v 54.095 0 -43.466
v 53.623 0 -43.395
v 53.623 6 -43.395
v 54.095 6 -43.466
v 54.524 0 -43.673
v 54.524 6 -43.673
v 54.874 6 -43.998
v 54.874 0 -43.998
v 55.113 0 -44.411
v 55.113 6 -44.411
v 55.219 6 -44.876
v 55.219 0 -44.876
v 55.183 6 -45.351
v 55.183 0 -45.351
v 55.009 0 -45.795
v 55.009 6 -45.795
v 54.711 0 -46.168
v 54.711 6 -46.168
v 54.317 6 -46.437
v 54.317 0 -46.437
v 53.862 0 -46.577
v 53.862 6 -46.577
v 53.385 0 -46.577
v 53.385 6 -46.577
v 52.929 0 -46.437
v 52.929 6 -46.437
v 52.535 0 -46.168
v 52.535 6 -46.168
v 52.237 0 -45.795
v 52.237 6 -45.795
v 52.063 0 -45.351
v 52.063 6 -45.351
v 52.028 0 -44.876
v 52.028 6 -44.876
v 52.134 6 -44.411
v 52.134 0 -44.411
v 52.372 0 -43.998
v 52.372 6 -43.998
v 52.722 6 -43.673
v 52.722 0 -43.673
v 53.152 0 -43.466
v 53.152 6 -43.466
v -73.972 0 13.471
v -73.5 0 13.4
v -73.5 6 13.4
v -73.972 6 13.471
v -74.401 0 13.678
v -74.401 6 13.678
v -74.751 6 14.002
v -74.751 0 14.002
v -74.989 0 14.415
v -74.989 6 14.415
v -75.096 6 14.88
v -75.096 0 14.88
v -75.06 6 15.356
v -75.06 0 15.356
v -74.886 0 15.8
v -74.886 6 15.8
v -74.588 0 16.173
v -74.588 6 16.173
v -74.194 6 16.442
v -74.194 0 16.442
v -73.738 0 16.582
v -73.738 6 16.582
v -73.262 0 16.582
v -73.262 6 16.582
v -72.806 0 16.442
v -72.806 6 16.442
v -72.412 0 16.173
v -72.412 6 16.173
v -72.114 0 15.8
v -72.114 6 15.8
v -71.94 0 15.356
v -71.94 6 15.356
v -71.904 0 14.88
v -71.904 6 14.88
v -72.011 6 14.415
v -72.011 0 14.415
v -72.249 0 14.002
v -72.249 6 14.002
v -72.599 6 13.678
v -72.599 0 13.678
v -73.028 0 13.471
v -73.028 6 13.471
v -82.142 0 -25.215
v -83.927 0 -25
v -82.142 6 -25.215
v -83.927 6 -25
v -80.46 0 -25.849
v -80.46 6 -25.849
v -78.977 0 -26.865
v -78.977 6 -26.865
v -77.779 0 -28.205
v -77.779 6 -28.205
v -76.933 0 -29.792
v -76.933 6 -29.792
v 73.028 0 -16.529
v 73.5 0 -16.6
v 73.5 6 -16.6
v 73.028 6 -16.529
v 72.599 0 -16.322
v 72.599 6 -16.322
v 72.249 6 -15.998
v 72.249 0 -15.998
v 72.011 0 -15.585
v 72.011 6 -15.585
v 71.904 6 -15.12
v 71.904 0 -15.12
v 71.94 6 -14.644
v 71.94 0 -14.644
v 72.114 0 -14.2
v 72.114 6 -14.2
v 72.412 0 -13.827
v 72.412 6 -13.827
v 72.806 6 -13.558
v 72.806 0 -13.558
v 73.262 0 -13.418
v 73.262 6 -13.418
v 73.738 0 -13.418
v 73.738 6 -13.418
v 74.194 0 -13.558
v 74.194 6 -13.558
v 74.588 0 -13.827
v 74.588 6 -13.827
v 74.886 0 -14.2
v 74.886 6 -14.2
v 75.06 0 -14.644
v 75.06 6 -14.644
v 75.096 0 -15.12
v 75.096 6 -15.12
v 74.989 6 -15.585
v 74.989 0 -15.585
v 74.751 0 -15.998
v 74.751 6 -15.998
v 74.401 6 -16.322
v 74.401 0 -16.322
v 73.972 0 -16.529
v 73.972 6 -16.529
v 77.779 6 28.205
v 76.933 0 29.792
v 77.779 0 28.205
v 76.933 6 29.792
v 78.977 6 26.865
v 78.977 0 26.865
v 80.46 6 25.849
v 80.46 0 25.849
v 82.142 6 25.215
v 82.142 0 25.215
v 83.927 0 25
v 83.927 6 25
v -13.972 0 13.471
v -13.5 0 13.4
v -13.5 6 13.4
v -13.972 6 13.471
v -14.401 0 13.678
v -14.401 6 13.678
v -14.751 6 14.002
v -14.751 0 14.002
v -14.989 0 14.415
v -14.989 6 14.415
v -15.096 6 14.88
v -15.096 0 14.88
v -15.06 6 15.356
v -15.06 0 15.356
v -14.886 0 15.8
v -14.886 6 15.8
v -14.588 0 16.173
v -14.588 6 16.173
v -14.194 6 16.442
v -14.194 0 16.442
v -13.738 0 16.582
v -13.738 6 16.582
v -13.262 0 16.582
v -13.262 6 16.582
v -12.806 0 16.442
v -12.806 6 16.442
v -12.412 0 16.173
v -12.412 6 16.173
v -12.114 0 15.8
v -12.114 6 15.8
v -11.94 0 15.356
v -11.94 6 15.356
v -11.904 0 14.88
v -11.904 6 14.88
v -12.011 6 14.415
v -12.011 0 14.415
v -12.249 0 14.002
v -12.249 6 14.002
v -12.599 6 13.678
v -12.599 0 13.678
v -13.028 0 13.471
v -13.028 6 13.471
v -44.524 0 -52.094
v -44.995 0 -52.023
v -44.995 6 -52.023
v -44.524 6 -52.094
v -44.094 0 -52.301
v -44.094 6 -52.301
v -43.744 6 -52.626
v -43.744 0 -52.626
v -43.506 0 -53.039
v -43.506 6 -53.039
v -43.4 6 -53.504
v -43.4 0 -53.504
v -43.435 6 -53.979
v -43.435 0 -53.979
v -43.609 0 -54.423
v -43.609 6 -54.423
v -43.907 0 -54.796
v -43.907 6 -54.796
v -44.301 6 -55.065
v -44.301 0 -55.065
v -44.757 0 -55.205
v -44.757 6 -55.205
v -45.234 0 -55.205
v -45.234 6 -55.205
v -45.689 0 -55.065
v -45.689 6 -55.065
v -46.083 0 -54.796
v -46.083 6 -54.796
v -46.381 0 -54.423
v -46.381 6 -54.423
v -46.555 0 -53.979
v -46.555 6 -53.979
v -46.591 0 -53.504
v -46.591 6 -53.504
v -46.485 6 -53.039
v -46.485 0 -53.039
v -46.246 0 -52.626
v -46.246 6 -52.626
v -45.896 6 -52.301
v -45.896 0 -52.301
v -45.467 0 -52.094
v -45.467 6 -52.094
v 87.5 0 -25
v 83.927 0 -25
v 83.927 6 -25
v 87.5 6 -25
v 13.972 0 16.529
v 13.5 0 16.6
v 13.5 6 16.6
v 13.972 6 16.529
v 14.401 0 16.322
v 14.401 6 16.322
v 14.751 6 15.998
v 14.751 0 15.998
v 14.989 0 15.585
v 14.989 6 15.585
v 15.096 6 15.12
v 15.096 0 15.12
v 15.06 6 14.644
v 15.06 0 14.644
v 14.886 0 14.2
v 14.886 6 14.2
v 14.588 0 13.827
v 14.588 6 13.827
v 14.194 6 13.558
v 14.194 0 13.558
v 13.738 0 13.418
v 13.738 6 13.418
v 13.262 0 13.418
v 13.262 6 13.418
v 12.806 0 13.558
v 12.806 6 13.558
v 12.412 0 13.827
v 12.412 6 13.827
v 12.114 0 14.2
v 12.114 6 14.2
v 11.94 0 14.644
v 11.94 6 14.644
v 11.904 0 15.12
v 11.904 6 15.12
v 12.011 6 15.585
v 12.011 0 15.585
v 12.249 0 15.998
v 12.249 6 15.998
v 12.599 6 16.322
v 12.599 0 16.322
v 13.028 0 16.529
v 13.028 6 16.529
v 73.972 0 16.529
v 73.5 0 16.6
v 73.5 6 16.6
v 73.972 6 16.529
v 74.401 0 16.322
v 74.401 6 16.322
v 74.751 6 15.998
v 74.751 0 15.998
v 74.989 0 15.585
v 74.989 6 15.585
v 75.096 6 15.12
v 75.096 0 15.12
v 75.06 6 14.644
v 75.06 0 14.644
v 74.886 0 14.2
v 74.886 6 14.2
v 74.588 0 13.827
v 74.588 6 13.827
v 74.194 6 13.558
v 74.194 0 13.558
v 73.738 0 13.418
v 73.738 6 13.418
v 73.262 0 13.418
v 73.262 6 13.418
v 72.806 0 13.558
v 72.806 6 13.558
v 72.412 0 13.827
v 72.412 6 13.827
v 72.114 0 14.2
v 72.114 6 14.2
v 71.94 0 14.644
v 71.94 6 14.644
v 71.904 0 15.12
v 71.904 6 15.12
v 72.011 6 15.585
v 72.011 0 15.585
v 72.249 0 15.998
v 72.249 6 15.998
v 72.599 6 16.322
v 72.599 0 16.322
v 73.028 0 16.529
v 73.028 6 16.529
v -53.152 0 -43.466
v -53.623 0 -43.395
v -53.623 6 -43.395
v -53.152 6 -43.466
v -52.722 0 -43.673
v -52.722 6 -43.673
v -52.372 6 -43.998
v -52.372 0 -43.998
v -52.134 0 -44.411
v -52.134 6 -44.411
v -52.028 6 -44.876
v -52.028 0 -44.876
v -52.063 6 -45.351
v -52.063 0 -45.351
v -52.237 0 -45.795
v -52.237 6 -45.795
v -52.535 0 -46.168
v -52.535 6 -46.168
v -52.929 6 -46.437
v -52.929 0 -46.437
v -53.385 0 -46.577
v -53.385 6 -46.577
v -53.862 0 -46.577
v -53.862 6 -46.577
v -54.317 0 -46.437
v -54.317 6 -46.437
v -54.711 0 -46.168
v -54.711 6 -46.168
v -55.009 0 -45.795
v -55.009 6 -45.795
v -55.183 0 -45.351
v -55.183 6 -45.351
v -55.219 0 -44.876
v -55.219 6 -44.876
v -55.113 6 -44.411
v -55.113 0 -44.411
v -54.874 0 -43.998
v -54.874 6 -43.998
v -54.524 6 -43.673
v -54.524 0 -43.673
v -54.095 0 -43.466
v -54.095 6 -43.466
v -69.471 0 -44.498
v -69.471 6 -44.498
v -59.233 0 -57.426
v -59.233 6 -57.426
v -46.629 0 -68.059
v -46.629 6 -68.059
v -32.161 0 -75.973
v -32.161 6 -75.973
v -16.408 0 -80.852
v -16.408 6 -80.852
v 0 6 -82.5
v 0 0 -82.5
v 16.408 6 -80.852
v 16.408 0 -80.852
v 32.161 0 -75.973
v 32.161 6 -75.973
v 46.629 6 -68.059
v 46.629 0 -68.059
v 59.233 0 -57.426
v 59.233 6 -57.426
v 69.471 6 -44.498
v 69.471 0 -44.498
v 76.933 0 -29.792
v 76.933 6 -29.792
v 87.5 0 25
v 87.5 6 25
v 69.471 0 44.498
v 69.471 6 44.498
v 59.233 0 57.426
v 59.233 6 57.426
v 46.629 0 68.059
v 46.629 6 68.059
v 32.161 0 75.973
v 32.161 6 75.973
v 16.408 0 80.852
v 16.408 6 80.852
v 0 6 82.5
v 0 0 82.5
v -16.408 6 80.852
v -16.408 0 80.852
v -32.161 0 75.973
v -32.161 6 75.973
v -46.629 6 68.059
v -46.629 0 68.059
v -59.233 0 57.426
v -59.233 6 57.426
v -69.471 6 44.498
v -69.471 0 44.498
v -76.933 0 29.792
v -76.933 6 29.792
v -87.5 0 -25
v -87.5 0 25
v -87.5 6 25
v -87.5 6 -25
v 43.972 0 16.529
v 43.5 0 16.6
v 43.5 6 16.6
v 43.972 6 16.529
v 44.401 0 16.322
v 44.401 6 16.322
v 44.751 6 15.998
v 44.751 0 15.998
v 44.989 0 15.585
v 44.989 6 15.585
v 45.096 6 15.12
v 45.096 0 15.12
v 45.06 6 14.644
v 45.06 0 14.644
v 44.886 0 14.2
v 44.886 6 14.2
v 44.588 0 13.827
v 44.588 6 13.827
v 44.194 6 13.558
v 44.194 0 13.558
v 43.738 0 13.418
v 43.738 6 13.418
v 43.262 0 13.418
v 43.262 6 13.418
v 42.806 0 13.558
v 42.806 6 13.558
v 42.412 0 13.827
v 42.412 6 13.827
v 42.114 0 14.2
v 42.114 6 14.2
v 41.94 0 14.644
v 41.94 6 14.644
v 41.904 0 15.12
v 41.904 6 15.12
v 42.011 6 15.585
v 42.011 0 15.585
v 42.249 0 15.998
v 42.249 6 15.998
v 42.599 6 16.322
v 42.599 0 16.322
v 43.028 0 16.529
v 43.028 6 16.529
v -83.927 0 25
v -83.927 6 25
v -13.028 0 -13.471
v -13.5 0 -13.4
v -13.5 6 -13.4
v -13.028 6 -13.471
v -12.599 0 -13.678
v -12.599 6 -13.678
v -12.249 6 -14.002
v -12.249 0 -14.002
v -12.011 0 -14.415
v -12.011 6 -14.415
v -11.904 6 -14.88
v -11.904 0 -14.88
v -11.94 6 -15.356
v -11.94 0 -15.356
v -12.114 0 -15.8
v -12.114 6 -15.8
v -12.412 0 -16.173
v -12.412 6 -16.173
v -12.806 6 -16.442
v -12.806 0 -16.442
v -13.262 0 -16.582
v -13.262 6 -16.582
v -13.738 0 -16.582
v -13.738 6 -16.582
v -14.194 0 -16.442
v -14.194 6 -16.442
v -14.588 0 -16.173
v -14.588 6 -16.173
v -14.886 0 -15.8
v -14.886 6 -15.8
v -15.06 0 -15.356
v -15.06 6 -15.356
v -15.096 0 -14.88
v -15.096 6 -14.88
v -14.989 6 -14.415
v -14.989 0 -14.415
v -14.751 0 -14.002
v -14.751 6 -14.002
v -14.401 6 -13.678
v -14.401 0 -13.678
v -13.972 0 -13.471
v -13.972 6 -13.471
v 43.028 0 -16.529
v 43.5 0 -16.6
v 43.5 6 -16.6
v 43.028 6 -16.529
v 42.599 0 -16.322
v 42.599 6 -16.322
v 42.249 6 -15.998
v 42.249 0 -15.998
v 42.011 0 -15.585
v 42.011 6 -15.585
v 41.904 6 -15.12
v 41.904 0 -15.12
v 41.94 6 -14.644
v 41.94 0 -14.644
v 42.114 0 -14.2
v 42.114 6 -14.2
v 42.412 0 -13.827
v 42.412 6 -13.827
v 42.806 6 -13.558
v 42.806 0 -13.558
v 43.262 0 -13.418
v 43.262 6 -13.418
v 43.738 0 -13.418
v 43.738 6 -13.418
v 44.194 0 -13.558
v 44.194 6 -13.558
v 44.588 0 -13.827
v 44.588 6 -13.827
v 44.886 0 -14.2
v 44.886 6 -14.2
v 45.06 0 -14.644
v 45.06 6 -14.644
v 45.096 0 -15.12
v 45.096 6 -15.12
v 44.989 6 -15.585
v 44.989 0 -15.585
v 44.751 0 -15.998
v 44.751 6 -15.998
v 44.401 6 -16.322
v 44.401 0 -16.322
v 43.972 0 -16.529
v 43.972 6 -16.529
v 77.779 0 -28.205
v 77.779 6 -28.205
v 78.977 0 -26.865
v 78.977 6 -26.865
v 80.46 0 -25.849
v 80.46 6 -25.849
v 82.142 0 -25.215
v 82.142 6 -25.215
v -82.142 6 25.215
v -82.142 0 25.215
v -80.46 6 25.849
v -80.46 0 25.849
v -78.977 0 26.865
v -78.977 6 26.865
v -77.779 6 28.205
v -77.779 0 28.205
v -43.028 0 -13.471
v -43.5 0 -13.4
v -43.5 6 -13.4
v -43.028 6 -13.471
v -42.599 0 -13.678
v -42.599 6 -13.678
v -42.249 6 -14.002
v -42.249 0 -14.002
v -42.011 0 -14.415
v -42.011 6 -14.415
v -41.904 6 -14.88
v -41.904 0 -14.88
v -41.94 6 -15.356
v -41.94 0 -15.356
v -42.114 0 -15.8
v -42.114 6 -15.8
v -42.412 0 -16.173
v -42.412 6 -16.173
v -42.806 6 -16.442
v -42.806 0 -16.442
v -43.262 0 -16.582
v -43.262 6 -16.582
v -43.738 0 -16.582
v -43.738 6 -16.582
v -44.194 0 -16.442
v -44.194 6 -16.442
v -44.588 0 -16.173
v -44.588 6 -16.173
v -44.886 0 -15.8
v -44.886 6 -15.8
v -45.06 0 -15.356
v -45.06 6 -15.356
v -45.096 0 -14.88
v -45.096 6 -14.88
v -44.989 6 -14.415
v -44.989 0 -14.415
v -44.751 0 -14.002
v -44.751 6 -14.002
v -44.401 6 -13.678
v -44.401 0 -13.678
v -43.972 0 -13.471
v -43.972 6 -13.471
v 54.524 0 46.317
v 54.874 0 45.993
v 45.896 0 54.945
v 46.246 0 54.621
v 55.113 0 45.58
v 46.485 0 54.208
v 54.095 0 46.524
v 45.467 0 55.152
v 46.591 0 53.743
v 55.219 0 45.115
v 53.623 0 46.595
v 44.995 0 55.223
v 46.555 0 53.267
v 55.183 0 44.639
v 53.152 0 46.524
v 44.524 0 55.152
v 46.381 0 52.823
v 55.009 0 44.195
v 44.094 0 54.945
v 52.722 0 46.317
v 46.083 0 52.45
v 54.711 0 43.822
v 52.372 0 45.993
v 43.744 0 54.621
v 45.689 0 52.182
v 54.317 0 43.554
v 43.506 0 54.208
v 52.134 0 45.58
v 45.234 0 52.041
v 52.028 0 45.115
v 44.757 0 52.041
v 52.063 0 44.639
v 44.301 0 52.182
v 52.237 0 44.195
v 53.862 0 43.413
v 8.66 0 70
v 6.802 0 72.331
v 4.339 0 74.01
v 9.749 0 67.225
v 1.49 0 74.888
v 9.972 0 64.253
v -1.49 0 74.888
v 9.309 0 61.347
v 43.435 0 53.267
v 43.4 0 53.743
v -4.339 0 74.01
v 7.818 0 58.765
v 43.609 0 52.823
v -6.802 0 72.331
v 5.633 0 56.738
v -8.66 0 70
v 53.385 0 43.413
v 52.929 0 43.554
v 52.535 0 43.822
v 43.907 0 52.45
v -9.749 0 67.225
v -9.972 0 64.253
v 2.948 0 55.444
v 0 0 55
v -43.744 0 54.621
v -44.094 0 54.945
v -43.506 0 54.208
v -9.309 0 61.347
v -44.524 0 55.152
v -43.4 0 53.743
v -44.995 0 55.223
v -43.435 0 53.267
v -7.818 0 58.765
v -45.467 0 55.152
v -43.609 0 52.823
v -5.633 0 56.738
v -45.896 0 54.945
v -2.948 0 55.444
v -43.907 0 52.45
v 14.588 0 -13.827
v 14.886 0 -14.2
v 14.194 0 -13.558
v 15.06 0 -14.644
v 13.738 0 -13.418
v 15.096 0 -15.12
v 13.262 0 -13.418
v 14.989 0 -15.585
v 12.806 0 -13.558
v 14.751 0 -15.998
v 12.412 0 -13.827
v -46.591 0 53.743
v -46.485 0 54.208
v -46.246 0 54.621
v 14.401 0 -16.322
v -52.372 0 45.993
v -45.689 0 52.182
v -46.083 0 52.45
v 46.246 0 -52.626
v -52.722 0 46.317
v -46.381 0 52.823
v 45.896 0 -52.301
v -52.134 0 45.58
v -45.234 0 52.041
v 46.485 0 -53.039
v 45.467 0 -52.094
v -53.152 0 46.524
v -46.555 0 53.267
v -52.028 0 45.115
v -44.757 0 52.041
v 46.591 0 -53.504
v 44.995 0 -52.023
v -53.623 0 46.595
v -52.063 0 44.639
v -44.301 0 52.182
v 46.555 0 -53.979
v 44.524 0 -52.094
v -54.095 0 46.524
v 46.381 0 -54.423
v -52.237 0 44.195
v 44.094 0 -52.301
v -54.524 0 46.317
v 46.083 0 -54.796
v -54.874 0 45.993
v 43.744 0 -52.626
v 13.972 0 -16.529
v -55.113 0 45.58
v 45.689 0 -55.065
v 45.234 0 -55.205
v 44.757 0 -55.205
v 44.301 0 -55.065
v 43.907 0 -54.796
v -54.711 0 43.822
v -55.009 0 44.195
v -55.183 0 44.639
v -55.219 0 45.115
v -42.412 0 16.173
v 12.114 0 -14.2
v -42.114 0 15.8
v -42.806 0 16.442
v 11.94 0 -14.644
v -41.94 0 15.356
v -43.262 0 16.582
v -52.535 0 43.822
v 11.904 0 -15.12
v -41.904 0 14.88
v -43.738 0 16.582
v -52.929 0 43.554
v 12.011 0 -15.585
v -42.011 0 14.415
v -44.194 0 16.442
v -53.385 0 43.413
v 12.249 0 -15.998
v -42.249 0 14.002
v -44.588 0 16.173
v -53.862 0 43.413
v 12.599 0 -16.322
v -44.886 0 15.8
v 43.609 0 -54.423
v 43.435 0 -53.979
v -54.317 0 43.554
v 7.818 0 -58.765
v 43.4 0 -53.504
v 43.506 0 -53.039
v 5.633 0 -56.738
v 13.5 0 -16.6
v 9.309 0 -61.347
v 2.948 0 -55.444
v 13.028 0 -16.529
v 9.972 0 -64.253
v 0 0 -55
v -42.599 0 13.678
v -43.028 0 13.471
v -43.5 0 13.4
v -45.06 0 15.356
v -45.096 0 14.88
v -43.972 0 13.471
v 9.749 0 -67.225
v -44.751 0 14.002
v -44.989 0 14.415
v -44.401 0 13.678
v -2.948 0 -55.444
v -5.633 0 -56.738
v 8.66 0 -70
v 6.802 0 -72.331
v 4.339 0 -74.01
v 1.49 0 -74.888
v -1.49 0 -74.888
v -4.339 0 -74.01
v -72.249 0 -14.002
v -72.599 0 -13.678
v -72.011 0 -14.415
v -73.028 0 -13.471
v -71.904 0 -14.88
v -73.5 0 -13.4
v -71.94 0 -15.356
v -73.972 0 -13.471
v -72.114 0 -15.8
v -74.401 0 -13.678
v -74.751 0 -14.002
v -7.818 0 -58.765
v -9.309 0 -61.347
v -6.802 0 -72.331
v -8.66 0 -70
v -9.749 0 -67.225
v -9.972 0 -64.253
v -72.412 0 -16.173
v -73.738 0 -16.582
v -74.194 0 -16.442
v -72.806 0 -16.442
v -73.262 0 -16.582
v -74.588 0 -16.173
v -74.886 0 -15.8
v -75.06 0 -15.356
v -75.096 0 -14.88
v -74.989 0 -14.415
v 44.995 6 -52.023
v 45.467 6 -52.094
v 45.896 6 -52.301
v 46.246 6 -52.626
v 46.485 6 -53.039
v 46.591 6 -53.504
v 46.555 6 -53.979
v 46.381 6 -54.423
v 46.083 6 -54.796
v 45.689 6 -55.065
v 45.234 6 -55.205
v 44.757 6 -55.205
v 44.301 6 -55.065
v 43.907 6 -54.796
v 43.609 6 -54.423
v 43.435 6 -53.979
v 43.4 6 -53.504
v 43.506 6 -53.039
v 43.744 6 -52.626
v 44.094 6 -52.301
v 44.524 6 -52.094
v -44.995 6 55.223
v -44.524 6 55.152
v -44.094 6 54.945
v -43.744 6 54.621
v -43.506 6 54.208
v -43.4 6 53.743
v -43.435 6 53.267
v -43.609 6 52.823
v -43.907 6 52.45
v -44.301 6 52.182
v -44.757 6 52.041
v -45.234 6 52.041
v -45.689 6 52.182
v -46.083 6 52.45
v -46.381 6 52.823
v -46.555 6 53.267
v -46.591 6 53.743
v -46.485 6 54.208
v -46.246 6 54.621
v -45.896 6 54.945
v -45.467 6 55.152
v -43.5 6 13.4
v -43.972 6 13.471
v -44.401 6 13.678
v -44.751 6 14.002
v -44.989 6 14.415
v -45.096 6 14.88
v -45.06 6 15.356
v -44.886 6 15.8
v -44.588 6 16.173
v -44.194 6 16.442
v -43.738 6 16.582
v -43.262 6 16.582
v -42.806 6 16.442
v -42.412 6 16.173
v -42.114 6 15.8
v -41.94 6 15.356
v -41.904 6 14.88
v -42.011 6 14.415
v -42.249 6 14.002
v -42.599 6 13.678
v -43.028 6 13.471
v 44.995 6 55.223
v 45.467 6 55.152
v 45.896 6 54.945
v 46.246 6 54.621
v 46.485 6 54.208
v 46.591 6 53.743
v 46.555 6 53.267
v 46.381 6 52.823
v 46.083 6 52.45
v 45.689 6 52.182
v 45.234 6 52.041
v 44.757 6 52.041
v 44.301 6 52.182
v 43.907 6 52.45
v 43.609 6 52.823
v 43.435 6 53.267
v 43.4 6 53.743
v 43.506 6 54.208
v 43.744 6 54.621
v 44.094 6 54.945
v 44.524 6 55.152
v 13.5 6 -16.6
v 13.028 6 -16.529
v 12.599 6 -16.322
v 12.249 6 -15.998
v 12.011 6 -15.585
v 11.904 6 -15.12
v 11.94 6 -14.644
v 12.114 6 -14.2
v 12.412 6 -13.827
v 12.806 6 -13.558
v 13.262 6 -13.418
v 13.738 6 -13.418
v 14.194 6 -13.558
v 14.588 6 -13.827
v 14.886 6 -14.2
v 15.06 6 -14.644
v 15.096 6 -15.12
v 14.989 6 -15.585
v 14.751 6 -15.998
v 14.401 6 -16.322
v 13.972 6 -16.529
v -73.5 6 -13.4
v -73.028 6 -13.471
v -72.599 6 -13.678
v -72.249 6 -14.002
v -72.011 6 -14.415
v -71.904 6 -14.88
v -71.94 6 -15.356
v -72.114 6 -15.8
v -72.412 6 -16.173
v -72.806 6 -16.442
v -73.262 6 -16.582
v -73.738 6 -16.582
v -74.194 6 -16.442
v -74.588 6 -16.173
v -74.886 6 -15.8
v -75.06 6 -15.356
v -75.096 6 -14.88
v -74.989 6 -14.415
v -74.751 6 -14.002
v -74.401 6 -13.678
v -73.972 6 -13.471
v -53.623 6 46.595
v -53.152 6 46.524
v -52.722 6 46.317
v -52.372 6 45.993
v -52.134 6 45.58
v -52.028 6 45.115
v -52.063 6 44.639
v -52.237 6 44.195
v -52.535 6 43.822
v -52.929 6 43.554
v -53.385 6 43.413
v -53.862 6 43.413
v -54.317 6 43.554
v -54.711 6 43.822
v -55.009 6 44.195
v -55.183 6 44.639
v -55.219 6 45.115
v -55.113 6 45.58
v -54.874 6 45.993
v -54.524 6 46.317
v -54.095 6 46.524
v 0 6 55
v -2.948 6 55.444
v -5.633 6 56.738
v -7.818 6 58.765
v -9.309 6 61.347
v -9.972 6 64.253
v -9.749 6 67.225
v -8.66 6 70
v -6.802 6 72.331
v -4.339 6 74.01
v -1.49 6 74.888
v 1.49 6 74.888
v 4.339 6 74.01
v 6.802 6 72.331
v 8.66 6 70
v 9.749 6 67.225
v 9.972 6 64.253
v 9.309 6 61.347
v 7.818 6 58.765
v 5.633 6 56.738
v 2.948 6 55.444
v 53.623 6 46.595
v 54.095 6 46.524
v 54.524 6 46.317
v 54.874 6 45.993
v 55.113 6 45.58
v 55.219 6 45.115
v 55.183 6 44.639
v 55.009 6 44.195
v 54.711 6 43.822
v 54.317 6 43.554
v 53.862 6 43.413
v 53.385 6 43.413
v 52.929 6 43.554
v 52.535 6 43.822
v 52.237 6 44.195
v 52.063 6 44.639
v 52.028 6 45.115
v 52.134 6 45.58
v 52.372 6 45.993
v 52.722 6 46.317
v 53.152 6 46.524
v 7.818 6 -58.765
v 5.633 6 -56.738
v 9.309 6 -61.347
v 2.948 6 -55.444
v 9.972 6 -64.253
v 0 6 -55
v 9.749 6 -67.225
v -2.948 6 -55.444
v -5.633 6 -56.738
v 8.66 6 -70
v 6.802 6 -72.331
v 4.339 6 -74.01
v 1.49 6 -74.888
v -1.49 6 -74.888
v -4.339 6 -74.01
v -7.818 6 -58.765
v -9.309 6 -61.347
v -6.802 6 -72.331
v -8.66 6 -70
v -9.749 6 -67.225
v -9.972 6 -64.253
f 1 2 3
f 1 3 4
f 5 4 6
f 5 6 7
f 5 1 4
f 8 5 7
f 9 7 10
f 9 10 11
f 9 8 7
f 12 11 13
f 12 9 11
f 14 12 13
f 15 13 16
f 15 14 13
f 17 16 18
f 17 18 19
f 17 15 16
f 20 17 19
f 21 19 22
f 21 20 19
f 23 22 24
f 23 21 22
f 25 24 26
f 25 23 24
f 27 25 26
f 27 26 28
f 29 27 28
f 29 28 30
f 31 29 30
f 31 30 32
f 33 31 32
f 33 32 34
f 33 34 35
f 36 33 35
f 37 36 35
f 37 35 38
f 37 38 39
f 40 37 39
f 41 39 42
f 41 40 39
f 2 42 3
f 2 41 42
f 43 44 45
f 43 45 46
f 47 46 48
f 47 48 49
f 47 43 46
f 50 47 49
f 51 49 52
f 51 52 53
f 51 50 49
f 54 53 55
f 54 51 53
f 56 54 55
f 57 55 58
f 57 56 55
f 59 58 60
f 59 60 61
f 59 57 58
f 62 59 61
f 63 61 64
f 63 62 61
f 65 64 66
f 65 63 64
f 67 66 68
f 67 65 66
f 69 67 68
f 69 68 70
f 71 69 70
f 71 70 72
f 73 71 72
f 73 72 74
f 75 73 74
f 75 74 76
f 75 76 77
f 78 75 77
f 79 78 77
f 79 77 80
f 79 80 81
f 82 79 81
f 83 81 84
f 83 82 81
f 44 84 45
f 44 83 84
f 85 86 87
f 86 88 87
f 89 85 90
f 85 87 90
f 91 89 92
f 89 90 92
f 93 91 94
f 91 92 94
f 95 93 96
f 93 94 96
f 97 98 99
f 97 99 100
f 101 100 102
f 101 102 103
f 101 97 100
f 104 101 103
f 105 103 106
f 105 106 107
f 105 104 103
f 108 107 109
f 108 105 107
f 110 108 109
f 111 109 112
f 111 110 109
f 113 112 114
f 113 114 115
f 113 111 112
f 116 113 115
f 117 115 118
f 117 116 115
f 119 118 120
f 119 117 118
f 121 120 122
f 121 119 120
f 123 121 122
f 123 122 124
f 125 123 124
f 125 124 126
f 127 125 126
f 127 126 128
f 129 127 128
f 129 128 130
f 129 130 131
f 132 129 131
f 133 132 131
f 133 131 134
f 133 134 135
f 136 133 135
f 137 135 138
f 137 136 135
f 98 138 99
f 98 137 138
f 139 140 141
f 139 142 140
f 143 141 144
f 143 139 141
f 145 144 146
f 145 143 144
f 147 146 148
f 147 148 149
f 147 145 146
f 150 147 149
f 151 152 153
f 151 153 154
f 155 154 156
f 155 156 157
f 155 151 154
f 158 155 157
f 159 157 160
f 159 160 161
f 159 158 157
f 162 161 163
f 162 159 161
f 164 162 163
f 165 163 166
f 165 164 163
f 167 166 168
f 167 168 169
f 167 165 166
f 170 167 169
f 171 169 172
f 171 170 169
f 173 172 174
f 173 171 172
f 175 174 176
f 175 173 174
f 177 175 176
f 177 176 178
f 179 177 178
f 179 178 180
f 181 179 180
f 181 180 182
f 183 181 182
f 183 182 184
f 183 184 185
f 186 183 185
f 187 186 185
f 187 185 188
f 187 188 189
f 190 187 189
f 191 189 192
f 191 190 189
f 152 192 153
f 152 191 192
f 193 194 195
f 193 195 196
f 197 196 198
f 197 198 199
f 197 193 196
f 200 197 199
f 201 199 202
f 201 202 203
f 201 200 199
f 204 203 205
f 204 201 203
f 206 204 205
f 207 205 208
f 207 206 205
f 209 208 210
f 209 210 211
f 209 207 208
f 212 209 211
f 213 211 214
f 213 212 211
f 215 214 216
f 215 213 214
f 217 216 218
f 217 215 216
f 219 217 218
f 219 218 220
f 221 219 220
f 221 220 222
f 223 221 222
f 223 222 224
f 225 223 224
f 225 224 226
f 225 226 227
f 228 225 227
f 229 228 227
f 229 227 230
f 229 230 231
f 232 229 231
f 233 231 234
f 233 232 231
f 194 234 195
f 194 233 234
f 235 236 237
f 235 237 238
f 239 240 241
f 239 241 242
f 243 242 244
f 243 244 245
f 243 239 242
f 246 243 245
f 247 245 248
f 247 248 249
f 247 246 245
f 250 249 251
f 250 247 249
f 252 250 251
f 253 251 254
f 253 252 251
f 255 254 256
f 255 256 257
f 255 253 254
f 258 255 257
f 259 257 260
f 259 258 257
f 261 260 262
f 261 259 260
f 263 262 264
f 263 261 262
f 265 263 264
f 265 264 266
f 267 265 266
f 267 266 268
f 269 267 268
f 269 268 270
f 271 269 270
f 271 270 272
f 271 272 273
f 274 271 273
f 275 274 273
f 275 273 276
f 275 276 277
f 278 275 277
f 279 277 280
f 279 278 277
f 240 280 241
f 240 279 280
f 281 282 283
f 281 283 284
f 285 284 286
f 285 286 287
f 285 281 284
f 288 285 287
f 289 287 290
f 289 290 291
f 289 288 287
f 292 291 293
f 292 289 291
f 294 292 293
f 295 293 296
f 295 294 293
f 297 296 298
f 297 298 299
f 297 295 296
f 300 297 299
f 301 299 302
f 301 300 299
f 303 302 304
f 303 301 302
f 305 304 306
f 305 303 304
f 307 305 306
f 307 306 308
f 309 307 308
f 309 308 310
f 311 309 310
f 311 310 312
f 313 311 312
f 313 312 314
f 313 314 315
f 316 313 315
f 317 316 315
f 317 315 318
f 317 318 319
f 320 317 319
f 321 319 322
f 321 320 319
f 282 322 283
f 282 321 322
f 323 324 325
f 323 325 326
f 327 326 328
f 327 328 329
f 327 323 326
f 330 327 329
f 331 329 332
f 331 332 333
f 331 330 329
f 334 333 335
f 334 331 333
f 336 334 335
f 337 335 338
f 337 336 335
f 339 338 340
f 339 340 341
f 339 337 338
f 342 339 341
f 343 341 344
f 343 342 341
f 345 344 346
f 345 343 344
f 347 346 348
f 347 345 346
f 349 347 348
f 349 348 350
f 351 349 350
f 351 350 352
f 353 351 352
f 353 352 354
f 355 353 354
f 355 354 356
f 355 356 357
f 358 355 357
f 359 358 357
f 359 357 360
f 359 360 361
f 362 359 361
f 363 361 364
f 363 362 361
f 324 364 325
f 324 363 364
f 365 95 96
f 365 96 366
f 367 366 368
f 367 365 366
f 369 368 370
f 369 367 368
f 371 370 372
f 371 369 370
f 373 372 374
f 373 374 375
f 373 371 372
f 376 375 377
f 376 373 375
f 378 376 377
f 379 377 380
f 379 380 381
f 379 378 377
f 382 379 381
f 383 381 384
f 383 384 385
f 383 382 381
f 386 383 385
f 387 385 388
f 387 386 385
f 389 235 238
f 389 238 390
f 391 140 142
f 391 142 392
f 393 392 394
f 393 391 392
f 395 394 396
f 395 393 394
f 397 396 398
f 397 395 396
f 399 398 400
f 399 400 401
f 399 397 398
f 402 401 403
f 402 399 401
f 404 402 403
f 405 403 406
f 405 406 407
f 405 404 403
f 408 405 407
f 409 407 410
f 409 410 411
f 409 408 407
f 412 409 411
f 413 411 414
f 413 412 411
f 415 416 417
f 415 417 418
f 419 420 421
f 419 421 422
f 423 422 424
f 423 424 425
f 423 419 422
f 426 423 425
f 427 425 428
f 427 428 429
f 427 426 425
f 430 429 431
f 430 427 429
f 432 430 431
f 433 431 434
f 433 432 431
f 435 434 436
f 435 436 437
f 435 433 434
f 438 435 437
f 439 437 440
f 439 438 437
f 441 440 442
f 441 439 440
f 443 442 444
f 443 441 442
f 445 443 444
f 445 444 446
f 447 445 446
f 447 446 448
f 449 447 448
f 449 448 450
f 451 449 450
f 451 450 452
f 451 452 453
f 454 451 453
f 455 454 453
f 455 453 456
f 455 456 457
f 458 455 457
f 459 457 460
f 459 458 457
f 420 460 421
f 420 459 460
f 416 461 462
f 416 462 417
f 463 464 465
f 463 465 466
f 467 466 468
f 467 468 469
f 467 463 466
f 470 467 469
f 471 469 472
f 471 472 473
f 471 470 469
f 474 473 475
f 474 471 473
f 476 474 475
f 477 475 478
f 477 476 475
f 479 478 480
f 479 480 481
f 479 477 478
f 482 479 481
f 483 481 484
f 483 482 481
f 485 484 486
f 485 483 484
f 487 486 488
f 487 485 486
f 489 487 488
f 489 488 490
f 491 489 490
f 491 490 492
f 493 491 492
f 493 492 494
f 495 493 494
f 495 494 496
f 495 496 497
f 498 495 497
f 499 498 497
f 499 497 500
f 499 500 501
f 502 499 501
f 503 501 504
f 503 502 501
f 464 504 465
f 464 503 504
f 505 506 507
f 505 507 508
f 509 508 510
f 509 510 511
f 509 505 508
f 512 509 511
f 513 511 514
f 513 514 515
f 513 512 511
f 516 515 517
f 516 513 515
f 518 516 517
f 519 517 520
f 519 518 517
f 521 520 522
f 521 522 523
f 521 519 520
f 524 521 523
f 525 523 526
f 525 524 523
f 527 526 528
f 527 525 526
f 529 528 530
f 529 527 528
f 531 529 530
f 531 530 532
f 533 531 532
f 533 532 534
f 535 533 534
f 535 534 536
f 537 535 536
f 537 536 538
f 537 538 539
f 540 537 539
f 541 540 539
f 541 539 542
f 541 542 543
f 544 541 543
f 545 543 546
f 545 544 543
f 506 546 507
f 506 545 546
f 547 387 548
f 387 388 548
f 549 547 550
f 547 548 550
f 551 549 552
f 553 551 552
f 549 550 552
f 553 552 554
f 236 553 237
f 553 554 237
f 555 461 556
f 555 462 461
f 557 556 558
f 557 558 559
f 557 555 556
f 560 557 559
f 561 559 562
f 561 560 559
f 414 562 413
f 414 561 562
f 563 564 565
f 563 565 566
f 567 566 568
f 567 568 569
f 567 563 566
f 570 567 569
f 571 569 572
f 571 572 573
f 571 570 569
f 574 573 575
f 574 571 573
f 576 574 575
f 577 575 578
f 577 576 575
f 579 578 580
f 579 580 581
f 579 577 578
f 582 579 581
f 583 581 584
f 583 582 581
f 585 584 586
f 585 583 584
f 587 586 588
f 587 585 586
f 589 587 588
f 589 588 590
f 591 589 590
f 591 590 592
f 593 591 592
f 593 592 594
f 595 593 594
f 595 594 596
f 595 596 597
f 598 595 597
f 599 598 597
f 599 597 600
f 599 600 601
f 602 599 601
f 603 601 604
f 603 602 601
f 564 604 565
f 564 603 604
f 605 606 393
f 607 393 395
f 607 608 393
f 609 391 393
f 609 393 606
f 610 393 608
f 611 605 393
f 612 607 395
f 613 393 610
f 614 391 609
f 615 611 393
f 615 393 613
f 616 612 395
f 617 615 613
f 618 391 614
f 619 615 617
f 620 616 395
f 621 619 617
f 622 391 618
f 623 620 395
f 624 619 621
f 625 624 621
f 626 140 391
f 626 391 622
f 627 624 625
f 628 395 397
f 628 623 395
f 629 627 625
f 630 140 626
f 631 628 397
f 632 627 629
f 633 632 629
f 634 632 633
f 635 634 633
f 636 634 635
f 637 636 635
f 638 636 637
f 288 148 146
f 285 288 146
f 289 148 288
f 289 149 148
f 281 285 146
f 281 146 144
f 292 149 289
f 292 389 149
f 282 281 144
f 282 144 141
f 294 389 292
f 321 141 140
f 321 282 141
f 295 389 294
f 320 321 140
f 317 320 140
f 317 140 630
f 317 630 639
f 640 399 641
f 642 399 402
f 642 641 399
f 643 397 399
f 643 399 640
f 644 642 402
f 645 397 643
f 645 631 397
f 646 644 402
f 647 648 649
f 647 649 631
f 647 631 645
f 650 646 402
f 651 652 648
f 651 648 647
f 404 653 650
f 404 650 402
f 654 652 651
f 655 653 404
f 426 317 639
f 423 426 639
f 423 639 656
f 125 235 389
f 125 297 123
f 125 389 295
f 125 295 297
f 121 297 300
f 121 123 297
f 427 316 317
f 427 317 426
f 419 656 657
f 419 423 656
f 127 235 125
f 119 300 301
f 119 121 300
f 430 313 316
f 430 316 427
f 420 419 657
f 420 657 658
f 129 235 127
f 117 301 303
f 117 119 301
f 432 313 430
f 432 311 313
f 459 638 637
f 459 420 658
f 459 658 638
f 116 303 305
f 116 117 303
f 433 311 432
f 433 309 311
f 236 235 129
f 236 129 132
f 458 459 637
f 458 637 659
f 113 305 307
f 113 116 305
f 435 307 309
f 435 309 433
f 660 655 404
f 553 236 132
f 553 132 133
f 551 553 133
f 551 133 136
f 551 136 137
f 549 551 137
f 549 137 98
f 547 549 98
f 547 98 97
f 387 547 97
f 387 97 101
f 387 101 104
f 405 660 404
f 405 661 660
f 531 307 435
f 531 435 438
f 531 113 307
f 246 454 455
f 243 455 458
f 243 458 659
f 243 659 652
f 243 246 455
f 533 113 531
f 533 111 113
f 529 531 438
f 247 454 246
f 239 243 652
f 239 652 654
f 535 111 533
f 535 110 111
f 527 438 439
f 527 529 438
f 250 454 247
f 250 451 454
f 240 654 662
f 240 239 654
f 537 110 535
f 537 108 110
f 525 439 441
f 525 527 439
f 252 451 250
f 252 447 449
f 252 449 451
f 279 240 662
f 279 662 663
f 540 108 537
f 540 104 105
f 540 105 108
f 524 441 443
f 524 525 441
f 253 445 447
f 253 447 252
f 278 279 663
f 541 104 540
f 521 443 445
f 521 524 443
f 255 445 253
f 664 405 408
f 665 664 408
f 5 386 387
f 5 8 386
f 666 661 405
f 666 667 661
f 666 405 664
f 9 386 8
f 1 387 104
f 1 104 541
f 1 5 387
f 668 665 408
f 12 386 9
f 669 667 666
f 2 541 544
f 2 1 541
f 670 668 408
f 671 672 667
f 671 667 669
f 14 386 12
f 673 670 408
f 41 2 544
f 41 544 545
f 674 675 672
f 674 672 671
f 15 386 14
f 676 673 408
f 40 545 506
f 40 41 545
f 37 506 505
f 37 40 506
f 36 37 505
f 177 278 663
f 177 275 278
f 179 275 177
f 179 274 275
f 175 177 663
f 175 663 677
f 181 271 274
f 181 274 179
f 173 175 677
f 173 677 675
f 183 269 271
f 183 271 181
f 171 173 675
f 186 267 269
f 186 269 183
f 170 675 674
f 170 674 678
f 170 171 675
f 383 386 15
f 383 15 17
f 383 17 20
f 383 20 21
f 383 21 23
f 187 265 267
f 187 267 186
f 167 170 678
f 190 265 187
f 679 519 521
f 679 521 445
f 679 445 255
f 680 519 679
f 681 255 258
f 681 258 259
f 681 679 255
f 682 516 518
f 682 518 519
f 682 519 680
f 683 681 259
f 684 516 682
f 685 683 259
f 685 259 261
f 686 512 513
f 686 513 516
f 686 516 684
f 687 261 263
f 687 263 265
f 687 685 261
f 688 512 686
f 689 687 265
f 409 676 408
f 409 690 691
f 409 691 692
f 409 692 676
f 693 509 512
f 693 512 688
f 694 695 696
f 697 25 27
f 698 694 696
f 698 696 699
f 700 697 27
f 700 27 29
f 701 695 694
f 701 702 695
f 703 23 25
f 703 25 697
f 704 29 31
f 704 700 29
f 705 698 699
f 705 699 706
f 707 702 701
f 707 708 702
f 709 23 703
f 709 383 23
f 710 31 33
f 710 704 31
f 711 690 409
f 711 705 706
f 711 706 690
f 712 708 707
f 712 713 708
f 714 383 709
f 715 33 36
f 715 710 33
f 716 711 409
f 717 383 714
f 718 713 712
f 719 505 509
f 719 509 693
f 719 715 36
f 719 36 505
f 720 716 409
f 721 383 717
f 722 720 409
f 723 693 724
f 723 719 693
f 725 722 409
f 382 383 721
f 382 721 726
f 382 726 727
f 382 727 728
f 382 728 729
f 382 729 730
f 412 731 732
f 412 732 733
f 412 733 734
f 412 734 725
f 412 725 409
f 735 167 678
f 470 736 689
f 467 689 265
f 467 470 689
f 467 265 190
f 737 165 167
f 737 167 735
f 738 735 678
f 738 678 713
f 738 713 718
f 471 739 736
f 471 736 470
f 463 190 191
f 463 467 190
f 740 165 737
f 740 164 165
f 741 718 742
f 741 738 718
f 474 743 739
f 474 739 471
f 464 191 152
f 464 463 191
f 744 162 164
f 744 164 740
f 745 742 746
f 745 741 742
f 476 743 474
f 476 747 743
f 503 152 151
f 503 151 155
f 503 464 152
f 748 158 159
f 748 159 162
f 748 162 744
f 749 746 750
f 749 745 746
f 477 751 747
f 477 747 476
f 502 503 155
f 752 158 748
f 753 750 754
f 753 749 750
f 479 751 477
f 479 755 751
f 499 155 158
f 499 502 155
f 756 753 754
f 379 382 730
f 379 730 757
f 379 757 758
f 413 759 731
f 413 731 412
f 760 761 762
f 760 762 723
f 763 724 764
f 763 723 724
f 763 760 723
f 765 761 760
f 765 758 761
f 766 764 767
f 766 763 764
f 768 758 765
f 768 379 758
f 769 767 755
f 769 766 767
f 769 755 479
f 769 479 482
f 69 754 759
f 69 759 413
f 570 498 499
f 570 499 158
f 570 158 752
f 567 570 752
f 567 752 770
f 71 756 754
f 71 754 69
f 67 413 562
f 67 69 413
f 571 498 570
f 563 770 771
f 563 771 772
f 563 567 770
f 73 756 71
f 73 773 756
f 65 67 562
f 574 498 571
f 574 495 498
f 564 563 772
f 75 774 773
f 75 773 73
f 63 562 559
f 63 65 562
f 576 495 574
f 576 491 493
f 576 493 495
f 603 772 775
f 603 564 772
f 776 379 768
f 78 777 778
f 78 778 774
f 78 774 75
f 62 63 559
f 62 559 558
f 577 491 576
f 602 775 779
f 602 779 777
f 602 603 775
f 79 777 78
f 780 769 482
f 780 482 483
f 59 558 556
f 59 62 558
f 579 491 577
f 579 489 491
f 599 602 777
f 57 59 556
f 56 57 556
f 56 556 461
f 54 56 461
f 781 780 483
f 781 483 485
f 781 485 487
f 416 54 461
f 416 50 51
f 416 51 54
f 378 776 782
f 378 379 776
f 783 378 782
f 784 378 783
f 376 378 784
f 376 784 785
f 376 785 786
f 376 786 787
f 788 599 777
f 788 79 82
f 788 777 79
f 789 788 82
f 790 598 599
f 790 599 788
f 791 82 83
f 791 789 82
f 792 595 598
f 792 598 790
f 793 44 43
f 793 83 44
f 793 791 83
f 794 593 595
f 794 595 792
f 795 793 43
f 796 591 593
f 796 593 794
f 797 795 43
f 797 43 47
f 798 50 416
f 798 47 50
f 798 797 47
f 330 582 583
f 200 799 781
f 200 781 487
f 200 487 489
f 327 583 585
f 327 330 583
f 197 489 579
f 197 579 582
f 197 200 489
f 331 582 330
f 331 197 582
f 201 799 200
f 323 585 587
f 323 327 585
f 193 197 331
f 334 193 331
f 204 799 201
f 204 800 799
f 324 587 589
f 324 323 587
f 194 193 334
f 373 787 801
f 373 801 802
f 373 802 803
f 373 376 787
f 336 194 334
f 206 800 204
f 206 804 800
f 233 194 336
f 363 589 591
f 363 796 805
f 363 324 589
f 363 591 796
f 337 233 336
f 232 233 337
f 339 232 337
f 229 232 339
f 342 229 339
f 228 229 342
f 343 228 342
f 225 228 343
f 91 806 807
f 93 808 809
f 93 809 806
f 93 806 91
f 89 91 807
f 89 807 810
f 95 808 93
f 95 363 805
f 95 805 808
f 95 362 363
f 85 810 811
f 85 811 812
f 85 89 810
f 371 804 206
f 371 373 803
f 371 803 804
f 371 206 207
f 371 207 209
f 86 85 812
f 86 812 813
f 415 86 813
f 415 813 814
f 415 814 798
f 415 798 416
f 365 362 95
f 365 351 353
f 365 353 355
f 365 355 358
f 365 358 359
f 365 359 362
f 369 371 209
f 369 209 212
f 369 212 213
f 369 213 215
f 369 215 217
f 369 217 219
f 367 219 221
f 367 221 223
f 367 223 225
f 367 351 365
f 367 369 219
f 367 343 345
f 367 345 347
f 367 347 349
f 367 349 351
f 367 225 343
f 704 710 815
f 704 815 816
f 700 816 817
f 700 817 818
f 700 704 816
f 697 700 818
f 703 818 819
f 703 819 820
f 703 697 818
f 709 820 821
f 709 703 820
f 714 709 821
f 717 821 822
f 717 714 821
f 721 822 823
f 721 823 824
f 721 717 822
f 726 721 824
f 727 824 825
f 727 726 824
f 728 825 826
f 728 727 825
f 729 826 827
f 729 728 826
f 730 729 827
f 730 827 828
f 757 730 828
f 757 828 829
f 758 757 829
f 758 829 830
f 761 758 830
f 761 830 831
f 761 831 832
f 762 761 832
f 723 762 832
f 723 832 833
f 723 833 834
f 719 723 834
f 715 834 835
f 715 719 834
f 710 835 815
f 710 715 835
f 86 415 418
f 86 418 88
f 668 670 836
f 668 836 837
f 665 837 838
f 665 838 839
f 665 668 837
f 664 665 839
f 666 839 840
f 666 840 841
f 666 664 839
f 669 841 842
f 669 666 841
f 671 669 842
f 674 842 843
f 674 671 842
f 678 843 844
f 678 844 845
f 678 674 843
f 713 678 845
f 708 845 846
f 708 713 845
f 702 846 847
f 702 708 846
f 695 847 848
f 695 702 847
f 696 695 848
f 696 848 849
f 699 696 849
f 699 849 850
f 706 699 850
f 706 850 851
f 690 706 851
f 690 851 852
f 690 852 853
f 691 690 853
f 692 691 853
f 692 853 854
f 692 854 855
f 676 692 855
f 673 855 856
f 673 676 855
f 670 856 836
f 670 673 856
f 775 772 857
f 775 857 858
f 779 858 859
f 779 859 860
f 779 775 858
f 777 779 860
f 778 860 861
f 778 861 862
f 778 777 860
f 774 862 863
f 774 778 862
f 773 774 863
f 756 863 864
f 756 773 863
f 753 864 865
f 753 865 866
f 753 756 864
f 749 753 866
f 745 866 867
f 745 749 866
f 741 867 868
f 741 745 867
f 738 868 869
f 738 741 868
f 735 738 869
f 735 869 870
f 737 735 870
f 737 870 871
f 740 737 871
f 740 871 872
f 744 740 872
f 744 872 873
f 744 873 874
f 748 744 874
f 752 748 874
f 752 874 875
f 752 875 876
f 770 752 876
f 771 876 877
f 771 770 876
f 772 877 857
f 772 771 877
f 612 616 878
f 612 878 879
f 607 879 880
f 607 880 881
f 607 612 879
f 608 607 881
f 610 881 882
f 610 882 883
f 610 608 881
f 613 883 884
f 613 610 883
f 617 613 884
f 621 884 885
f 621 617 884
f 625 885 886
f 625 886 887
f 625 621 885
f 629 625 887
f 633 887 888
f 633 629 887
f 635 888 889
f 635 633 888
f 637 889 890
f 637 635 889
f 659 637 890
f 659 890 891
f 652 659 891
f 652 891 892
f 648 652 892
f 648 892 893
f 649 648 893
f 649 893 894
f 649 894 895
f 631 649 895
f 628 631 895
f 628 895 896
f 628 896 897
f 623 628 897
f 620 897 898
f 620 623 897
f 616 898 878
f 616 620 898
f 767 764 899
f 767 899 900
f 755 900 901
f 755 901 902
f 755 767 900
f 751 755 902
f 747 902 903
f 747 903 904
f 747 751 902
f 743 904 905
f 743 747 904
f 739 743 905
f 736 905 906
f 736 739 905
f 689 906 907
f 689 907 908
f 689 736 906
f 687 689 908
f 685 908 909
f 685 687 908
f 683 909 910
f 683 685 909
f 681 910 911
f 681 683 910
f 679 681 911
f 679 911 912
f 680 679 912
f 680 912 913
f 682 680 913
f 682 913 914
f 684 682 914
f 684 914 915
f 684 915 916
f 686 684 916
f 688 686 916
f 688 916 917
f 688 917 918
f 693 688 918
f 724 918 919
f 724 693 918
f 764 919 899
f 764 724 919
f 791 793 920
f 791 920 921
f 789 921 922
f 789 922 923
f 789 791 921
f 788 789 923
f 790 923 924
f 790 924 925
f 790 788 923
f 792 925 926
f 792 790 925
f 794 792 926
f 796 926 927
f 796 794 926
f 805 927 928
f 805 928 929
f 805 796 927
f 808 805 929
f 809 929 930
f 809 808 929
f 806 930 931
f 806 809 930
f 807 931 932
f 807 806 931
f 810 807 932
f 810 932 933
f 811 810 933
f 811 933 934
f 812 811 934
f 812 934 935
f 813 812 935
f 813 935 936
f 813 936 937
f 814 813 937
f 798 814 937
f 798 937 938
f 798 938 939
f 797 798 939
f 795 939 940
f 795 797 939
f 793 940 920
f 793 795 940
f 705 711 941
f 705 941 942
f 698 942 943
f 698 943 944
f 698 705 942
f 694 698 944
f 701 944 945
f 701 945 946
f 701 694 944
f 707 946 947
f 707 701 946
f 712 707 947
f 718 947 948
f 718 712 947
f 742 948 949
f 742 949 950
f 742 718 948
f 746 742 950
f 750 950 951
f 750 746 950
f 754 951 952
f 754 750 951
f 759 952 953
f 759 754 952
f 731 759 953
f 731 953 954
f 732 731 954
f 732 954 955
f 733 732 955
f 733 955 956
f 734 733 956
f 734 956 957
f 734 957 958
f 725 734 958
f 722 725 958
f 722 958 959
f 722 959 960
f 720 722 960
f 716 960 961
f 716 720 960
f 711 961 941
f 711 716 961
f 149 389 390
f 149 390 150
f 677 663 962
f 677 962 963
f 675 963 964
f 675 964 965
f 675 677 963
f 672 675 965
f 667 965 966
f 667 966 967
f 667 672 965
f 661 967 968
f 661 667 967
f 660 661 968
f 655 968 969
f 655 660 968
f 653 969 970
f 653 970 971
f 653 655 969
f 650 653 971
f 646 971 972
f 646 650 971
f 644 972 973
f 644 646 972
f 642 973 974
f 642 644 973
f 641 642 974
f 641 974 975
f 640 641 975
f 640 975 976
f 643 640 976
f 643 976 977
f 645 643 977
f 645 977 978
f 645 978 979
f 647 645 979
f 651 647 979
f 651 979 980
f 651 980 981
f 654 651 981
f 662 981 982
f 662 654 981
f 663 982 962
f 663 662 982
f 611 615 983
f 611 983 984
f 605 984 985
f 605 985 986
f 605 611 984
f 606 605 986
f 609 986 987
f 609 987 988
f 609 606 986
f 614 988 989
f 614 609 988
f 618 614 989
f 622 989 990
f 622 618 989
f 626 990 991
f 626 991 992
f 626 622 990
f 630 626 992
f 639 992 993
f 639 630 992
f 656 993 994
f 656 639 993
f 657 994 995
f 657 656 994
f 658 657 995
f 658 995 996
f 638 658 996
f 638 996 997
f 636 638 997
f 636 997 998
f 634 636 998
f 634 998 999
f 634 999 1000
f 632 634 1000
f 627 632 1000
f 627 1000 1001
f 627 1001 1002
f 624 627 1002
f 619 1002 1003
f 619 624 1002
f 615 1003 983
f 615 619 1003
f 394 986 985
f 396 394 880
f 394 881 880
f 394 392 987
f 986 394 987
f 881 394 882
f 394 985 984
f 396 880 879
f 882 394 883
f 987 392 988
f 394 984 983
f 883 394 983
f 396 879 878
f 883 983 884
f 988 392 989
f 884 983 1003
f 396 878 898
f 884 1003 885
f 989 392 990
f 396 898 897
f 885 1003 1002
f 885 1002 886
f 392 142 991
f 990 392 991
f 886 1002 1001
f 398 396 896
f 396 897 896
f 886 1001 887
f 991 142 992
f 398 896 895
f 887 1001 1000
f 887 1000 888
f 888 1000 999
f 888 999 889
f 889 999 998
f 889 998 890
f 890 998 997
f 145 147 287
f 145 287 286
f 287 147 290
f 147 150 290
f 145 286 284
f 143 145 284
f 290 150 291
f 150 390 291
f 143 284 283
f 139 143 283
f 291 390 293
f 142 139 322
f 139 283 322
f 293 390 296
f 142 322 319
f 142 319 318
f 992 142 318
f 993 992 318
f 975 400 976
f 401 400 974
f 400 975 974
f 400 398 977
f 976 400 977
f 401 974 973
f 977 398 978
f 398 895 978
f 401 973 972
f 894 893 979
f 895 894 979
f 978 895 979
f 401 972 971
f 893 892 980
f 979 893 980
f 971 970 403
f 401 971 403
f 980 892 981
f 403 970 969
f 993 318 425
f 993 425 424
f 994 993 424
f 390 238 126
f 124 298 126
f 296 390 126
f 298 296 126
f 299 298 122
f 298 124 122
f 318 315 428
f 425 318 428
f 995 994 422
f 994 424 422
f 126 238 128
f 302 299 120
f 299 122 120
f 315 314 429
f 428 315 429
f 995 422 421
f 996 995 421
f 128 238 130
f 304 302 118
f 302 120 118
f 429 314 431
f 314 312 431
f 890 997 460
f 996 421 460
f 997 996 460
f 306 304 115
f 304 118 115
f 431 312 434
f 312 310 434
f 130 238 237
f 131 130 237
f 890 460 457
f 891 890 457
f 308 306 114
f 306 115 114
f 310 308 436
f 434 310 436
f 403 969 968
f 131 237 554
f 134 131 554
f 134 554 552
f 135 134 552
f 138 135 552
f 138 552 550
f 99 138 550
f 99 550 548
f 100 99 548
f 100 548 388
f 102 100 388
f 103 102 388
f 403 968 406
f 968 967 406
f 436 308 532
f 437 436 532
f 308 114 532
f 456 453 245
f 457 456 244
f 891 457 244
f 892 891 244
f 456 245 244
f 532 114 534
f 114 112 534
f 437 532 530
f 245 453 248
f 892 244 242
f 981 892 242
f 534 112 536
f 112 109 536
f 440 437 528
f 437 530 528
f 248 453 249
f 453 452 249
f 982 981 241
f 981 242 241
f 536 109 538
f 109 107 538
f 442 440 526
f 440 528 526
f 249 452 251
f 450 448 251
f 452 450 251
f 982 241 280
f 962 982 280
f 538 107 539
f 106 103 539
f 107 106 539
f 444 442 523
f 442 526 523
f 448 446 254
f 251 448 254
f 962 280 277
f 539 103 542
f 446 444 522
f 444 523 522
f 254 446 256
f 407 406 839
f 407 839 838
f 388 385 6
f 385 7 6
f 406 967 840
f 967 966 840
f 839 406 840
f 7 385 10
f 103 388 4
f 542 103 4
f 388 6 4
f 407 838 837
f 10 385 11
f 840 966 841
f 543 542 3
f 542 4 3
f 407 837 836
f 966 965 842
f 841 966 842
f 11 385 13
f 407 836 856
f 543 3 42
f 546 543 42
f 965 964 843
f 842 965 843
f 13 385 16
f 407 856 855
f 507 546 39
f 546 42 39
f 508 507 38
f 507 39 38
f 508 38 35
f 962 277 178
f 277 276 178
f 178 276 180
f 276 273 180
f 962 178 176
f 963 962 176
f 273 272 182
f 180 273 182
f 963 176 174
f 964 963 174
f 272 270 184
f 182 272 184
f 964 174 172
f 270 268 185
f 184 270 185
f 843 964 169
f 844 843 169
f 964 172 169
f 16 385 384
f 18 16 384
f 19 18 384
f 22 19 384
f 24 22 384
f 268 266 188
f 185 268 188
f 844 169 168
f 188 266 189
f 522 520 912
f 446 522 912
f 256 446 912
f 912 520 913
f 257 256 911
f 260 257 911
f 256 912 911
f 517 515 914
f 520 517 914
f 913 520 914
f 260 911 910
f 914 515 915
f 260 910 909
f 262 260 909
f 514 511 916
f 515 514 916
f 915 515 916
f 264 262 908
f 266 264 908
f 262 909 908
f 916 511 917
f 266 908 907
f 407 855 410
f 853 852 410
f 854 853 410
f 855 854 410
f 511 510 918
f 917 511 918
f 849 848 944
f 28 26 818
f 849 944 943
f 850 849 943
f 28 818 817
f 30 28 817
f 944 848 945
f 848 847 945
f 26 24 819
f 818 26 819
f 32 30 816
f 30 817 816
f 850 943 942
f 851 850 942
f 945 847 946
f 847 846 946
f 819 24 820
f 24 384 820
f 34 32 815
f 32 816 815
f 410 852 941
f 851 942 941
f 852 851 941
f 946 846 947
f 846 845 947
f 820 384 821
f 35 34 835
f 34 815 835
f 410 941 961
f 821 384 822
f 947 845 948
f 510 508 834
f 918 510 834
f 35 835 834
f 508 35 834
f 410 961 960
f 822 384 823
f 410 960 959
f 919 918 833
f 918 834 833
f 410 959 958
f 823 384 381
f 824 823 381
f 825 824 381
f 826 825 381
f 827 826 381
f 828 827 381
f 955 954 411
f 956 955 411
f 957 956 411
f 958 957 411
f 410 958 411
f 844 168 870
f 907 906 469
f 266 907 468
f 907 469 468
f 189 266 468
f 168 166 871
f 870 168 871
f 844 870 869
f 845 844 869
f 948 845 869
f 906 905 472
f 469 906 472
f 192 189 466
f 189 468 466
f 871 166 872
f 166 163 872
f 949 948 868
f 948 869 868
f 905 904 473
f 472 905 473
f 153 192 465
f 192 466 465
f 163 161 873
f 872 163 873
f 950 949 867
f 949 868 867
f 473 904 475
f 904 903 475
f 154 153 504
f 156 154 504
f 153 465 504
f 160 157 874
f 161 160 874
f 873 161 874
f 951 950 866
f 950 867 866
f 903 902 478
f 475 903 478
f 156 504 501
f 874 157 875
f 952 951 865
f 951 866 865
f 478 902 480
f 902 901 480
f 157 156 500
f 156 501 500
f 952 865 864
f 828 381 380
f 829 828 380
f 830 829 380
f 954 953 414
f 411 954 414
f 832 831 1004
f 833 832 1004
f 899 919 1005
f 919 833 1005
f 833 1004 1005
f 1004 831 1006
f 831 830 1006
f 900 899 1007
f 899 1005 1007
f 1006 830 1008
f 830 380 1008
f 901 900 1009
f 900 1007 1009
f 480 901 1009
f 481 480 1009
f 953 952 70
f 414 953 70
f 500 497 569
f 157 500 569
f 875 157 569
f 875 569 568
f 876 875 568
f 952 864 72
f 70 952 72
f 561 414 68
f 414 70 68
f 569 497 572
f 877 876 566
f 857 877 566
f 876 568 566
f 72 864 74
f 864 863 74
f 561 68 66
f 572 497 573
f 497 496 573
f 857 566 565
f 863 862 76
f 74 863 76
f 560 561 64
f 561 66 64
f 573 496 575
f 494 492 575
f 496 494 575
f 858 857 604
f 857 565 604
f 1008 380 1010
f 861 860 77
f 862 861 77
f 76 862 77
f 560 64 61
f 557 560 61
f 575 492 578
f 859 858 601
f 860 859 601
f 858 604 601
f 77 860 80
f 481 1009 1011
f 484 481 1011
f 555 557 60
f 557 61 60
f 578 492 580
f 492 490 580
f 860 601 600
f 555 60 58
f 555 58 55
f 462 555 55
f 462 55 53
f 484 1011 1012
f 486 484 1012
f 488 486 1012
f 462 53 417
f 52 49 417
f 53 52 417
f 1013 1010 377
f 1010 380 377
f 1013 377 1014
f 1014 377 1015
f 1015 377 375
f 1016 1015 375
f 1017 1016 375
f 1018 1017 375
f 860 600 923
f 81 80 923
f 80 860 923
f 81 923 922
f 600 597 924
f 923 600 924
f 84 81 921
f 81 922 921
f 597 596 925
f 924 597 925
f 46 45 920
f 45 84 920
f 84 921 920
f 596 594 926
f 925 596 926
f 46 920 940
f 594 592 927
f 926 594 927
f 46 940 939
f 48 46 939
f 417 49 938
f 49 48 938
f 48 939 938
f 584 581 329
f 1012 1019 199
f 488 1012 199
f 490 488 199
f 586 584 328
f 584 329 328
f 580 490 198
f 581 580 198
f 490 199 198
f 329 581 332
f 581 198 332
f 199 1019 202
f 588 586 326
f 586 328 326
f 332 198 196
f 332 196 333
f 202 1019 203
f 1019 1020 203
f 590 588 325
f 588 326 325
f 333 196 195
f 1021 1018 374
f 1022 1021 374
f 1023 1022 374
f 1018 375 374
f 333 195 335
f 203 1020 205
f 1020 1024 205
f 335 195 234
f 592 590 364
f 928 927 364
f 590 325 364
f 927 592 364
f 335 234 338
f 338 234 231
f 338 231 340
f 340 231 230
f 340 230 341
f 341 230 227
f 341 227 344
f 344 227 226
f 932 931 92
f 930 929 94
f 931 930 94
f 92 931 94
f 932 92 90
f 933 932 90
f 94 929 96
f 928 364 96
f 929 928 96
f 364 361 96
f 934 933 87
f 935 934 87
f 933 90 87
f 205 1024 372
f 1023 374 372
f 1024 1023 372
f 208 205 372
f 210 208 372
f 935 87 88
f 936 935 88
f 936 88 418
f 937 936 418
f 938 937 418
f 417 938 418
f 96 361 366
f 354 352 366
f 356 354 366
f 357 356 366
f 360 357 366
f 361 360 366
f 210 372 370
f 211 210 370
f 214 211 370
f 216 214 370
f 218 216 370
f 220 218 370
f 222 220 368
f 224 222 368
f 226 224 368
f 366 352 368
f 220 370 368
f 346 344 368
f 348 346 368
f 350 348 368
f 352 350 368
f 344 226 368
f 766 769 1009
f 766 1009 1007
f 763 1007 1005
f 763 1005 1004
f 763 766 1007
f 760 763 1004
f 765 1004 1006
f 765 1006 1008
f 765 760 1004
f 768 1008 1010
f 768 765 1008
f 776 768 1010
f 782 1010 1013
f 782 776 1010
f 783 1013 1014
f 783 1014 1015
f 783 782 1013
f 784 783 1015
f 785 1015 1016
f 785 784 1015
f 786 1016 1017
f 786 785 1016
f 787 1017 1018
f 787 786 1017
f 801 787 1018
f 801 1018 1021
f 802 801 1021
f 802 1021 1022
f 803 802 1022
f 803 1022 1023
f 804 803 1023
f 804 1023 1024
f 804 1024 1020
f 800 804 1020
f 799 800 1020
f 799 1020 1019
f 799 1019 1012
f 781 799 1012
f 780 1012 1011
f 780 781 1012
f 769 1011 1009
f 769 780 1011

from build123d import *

# Parameters (mm, degrees)
ESQUISSE1_R        = 1.6
ESQUISSE1_R_2      = 10
BOSS_EXTRU_1_DEPTH = 6
CONG_1_R           = 7.5


with BuildPart() as part:
    # Esquisse1 → Boss.-Extru.1 (new body)
    with BuildSketch(Plane(origin=(0, 0, 0), x_dir=(1, 0, 0), z_dir=(0, 1, 0))):
        with BuildLine():
            Line((-87.5, 25), (-78.620925968, 25))
            ThreePointArc((-78.620925968, 25), (0, 82.5), (78.620925968, 25))
            Line((78.620925968, 25), (87.5, 25))
            Line((87.5, 25), (87.5, -25))
            Line((87.5, -25), (78.620925968, -25))
            ThreePointArc((78.620925968, -25), (0, -82.5), (-78.620925968, -25))
            Line((-78.620925968, -25), (-87.5, -25))
            Line((-87.5, -25), (-87.5, 25))
        make_face()
        with Locations(Location((-53.623111018, 44.995132678, 0), (0, 0, 270))):
            Circle(ESQUISSE1_R, mode=Mode.SUBTRACT)
        with Locations(Location((-44.995132678, 53.623111018, 0), (0, 0, 270))):
            Circle(ESQUISSE1_R, mode=Mode.SUBTRACT)
        with Locations(Location((53.623111018, 44.995132678, 0), (0, 0, 270))):
            Circle(ESQUISSE1_R, mode=Mode.SUBTRACT)
        with Locations(Location((44.995132678, 53.623111018, 0), (0, 0, 270))):
            Circle(ESQUISSE1_R, mode=Mode.SUBTRACT)
        with Locations(Location((44.995132678, -53.623111018, 0), (0, 0, 270))):
            Circle(ESQUISSE1_R, mode=Mode.SUBTRACT)
        with Locations(Location((53.623111018, -44.995132678, 0), (0, 0, 270))):
            Circle(ESQUISSE1_R, mode=Mode.SUBTRACT)
        with Locations(Location((-53.623111018, -44.995132678, 0), (0, 0, 270))):
            Circle(ESQUISSE1_R, mode=Mode.SUBTRACT)
        with Locations(Location((-44.995132678, -53.623111018, 0), (0, 0, 270))):
            Circle(ESQUISSE1_R, mode=Mode.SUBTRACT)
        with Locations(Location((0, 65, 0), (0, 0, 270))):
            Circle(ESQUISSE1_R_2, mode=Mode.SUBTRACT)
        with Locations(Location((0, -65, 0), (0, 0, 90))):
            Circle(ESQUISSE1_R_2, mode=Mode.SUBTRACT)
        with Locations(Location((-73.5, 15, 0), (0, 0, 270))):
            Circle(ESQUISSE1_R, mode=Mode.SUBTRACT)
        with Locations(Location((-73.5, -15, 0), (0, 0, 90))):
            Circle(ESQUISSE1_R, mode=Mode.SUBTRACT)
        with Locations(Location((-43.5, 15, 0), (0, 0, 270))):
            Circle(ESQUISSE1_R, mode=Mode.SUBTRACT)
        with Locations(Location((-43.5, -15, 0), (0, 0, 90))):
            Circle(ESQUISSE1_R, mode=Mode.SUBTRACT)
        with Locations(Location((-13.5, 15, 0), (0, 0, 270))):
            Circle(ESQUISSE1_R, mode=Mode.SUBTRACT)
        with Locations(Location((-13.5, -15, 0), (0, 0, 90))):
            Circle(ESQUISSE1_R, mode=Mode.SUBTRACT)
        with Locations(Location((13.5, -15, 0), (0, 0, 270))):
            Circle(ESQUISSE1_R, mode=Mode.SUBTRACT)
        with Locations(Location((13.5, 15, 0), (0, 0, 90))):
            Circle(ESQUISSE1_R, mode=Mode.SUBTRACT)
        with Locations(Location((43.5, 15, 0), (0, 0, 90))):
            Circle(ESQUISSE1_R, mode=Mode.SUBTRACT)
        with Locations(Location((43.5, -15, 0), (0, 0, 270))):
            Circle(ESQUISSE1_R, mode=Mode.SUBTRACT)
        with Locations(Location((73.5, -15, 0), (0, 0, 270))):
            Circle(ESQUISSE1_R, mode=Mode.SUBTRACT)
        with Locations(Location((73.5, 15, 0), (0, 0, 90))):
            Circle(ESQUISSE1_R, mode=Mode.SUBTRACT)
    extrude(amount=BOSS_EXTRU_1_DEPTH)

    # Congé1
    cong_1_edges = [part.edges().sort_by_distance(p)[0] for p in [
        (-78.620925968, 3, -25),
        (78.620925968, 3, -25),
        (78.620925968, 3, 25),
        (-78.620925968, 3, 25),
    ]]
    fillet(cong_1_edges, radius=CONG_1_R)


solid = part.part
